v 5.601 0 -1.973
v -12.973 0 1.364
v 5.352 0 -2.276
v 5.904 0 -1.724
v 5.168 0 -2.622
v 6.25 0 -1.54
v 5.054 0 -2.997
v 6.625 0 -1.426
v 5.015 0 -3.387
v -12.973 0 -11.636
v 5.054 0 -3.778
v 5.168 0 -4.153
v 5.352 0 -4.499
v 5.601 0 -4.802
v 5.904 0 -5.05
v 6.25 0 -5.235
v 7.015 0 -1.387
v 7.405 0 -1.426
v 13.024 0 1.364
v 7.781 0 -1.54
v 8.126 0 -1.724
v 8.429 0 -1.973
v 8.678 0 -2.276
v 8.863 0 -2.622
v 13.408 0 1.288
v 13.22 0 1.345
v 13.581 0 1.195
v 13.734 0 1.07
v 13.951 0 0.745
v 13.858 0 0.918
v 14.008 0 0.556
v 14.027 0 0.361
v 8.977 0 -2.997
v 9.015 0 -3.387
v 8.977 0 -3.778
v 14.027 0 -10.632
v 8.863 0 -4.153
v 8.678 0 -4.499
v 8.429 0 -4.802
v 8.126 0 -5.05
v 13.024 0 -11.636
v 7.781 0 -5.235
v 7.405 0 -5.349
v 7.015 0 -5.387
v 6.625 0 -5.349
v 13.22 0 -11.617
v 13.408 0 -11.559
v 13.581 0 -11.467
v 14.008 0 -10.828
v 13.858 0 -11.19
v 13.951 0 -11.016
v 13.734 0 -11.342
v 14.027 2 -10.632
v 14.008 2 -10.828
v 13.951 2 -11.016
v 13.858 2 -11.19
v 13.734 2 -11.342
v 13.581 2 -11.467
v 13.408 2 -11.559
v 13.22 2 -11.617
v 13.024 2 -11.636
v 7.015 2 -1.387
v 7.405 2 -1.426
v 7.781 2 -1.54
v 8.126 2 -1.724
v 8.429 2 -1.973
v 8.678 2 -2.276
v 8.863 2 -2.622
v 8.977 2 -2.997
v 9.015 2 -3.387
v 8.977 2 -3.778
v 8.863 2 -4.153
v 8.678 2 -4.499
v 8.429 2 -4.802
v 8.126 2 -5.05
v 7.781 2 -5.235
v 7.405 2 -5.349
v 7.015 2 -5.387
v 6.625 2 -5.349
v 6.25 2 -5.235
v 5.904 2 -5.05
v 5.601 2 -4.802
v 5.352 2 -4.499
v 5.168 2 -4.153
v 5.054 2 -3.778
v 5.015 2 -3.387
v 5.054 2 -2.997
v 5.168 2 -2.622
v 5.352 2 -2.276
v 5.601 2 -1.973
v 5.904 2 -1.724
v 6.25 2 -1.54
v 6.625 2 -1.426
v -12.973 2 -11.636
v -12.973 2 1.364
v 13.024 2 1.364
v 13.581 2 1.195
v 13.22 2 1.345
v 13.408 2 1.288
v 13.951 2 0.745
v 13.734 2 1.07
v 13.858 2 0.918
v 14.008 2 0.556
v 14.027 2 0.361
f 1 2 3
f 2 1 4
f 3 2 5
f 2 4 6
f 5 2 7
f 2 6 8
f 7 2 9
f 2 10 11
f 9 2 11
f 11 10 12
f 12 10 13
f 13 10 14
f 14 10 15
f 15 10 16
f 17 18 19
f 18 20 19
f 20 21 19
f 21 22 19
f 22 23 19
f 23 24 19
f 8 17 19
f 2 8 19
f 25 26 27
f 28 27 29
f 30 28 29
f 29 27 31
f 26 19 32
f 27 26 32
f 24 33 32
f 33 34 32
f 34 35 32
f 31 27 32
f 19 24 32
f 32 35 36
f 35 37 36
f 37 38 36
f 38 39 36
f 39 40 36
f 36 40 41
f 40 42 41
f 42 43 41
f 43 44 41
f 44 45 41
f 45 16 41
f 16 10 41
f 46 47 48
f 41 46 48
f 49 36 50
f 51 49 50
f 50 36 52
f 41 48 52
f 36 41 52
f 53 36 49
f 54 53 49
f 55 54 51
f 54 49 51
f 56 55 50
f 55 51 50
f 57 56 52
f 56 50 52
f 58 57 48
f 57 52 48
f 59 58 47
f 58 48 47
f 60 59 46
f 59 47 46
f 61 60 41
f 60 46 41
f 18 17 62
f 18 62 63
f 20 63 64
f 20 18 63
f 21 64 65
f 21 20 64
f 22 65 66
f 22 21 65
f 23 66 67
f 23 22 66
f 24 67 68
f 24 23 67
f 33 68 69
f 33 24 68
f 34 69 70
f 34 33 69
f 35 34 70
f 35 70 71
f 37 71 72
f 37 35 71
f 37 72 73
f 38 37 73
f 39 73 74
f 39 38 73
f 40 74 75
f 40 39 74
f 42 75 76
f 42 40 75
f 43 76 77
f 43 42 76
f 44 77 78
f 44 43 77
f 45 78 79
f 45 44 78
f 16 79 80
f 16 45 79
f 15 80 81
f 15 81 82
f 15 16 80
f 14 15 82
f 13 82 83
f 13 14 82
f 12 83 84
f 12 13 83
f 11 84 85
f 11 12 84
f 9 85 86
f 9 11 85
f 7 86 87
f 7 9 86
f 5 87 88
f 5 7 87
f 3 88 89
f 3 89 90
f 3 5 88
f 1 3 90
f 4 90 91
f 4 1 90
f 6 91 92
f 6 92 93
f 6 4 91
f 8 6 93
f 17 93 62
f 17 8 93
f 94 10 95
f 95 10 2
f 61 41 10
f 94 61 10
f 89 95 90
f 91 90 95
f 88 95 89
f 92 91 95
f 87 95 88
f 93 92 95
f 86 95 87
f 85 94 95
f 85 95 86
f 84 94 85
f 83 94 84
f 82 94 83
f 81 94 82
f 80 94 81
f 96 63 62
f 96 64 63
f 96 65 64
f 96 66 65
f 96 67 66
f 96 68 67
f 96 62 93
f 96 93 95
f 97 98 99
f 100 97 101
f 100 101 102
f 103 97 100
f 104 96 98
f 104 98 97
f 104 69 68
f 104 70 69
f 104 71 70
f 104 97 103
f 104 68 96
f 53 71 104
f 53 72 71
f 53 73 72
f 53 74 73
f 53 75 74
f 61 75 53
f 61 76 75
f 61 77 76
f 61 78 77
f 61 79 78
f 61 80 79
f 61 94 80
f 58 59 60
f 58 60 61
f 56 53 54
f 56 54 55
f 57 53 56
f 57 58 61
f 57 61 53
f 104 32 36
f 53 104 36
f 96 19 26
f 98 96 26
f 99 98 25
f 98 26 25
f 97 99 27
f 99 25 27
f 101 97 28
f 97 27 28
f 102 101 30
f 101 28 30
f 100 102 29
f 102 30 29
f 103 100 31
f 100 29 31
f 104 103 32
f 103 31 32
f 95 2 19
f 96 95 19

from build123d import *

# Parameters (mm, degrees)
SKETCH1_R           = 2
BOSS_EXTRUDE1_DEPTH = 2


with BuildPart() as part:
    # Sketch1 → Boss-Extrude1 (new body)
    with BuildSketch(Plane(origin=(0, 0, 0), x_dir=(1, 0, 0), z_dir=(0, 1, 0))):
        with BuildLine():
            Line((14.027461704, 3.38740458), (14.027461704, 10.632365856))
            ThreePointArc((14.027461704, 10.632365856), (13.733553665, 11.34192263), (13.023996891, 11.635830669))
            Line((13.023996891, 11.635830669), (-12.972538296, 11.635830669))
            Line((-12.972538296, 11.635830669), (-12.972538296, -1.364169331))
            Line((-12.972538296, -1.364169331), (13.023996891, -1.364169331))
            ThreePointArc((13.023996891, -1.364169331), (13.733553665, -1.070261292), (14.027461704, -0.360704518))
            Line((14.027461704, -0.360704518), (14.027461704, 3.38740458))
        make_face()
        with Locations(Location((7.015267176, 3.38740458, 0), (0, 0, 270))):
            Circle(SKETCH1_R, mode=Mode.SUBTRACT)
    extrude(amount=BOSS_EXTRUDE1_DEPTH)


solid = part.part
